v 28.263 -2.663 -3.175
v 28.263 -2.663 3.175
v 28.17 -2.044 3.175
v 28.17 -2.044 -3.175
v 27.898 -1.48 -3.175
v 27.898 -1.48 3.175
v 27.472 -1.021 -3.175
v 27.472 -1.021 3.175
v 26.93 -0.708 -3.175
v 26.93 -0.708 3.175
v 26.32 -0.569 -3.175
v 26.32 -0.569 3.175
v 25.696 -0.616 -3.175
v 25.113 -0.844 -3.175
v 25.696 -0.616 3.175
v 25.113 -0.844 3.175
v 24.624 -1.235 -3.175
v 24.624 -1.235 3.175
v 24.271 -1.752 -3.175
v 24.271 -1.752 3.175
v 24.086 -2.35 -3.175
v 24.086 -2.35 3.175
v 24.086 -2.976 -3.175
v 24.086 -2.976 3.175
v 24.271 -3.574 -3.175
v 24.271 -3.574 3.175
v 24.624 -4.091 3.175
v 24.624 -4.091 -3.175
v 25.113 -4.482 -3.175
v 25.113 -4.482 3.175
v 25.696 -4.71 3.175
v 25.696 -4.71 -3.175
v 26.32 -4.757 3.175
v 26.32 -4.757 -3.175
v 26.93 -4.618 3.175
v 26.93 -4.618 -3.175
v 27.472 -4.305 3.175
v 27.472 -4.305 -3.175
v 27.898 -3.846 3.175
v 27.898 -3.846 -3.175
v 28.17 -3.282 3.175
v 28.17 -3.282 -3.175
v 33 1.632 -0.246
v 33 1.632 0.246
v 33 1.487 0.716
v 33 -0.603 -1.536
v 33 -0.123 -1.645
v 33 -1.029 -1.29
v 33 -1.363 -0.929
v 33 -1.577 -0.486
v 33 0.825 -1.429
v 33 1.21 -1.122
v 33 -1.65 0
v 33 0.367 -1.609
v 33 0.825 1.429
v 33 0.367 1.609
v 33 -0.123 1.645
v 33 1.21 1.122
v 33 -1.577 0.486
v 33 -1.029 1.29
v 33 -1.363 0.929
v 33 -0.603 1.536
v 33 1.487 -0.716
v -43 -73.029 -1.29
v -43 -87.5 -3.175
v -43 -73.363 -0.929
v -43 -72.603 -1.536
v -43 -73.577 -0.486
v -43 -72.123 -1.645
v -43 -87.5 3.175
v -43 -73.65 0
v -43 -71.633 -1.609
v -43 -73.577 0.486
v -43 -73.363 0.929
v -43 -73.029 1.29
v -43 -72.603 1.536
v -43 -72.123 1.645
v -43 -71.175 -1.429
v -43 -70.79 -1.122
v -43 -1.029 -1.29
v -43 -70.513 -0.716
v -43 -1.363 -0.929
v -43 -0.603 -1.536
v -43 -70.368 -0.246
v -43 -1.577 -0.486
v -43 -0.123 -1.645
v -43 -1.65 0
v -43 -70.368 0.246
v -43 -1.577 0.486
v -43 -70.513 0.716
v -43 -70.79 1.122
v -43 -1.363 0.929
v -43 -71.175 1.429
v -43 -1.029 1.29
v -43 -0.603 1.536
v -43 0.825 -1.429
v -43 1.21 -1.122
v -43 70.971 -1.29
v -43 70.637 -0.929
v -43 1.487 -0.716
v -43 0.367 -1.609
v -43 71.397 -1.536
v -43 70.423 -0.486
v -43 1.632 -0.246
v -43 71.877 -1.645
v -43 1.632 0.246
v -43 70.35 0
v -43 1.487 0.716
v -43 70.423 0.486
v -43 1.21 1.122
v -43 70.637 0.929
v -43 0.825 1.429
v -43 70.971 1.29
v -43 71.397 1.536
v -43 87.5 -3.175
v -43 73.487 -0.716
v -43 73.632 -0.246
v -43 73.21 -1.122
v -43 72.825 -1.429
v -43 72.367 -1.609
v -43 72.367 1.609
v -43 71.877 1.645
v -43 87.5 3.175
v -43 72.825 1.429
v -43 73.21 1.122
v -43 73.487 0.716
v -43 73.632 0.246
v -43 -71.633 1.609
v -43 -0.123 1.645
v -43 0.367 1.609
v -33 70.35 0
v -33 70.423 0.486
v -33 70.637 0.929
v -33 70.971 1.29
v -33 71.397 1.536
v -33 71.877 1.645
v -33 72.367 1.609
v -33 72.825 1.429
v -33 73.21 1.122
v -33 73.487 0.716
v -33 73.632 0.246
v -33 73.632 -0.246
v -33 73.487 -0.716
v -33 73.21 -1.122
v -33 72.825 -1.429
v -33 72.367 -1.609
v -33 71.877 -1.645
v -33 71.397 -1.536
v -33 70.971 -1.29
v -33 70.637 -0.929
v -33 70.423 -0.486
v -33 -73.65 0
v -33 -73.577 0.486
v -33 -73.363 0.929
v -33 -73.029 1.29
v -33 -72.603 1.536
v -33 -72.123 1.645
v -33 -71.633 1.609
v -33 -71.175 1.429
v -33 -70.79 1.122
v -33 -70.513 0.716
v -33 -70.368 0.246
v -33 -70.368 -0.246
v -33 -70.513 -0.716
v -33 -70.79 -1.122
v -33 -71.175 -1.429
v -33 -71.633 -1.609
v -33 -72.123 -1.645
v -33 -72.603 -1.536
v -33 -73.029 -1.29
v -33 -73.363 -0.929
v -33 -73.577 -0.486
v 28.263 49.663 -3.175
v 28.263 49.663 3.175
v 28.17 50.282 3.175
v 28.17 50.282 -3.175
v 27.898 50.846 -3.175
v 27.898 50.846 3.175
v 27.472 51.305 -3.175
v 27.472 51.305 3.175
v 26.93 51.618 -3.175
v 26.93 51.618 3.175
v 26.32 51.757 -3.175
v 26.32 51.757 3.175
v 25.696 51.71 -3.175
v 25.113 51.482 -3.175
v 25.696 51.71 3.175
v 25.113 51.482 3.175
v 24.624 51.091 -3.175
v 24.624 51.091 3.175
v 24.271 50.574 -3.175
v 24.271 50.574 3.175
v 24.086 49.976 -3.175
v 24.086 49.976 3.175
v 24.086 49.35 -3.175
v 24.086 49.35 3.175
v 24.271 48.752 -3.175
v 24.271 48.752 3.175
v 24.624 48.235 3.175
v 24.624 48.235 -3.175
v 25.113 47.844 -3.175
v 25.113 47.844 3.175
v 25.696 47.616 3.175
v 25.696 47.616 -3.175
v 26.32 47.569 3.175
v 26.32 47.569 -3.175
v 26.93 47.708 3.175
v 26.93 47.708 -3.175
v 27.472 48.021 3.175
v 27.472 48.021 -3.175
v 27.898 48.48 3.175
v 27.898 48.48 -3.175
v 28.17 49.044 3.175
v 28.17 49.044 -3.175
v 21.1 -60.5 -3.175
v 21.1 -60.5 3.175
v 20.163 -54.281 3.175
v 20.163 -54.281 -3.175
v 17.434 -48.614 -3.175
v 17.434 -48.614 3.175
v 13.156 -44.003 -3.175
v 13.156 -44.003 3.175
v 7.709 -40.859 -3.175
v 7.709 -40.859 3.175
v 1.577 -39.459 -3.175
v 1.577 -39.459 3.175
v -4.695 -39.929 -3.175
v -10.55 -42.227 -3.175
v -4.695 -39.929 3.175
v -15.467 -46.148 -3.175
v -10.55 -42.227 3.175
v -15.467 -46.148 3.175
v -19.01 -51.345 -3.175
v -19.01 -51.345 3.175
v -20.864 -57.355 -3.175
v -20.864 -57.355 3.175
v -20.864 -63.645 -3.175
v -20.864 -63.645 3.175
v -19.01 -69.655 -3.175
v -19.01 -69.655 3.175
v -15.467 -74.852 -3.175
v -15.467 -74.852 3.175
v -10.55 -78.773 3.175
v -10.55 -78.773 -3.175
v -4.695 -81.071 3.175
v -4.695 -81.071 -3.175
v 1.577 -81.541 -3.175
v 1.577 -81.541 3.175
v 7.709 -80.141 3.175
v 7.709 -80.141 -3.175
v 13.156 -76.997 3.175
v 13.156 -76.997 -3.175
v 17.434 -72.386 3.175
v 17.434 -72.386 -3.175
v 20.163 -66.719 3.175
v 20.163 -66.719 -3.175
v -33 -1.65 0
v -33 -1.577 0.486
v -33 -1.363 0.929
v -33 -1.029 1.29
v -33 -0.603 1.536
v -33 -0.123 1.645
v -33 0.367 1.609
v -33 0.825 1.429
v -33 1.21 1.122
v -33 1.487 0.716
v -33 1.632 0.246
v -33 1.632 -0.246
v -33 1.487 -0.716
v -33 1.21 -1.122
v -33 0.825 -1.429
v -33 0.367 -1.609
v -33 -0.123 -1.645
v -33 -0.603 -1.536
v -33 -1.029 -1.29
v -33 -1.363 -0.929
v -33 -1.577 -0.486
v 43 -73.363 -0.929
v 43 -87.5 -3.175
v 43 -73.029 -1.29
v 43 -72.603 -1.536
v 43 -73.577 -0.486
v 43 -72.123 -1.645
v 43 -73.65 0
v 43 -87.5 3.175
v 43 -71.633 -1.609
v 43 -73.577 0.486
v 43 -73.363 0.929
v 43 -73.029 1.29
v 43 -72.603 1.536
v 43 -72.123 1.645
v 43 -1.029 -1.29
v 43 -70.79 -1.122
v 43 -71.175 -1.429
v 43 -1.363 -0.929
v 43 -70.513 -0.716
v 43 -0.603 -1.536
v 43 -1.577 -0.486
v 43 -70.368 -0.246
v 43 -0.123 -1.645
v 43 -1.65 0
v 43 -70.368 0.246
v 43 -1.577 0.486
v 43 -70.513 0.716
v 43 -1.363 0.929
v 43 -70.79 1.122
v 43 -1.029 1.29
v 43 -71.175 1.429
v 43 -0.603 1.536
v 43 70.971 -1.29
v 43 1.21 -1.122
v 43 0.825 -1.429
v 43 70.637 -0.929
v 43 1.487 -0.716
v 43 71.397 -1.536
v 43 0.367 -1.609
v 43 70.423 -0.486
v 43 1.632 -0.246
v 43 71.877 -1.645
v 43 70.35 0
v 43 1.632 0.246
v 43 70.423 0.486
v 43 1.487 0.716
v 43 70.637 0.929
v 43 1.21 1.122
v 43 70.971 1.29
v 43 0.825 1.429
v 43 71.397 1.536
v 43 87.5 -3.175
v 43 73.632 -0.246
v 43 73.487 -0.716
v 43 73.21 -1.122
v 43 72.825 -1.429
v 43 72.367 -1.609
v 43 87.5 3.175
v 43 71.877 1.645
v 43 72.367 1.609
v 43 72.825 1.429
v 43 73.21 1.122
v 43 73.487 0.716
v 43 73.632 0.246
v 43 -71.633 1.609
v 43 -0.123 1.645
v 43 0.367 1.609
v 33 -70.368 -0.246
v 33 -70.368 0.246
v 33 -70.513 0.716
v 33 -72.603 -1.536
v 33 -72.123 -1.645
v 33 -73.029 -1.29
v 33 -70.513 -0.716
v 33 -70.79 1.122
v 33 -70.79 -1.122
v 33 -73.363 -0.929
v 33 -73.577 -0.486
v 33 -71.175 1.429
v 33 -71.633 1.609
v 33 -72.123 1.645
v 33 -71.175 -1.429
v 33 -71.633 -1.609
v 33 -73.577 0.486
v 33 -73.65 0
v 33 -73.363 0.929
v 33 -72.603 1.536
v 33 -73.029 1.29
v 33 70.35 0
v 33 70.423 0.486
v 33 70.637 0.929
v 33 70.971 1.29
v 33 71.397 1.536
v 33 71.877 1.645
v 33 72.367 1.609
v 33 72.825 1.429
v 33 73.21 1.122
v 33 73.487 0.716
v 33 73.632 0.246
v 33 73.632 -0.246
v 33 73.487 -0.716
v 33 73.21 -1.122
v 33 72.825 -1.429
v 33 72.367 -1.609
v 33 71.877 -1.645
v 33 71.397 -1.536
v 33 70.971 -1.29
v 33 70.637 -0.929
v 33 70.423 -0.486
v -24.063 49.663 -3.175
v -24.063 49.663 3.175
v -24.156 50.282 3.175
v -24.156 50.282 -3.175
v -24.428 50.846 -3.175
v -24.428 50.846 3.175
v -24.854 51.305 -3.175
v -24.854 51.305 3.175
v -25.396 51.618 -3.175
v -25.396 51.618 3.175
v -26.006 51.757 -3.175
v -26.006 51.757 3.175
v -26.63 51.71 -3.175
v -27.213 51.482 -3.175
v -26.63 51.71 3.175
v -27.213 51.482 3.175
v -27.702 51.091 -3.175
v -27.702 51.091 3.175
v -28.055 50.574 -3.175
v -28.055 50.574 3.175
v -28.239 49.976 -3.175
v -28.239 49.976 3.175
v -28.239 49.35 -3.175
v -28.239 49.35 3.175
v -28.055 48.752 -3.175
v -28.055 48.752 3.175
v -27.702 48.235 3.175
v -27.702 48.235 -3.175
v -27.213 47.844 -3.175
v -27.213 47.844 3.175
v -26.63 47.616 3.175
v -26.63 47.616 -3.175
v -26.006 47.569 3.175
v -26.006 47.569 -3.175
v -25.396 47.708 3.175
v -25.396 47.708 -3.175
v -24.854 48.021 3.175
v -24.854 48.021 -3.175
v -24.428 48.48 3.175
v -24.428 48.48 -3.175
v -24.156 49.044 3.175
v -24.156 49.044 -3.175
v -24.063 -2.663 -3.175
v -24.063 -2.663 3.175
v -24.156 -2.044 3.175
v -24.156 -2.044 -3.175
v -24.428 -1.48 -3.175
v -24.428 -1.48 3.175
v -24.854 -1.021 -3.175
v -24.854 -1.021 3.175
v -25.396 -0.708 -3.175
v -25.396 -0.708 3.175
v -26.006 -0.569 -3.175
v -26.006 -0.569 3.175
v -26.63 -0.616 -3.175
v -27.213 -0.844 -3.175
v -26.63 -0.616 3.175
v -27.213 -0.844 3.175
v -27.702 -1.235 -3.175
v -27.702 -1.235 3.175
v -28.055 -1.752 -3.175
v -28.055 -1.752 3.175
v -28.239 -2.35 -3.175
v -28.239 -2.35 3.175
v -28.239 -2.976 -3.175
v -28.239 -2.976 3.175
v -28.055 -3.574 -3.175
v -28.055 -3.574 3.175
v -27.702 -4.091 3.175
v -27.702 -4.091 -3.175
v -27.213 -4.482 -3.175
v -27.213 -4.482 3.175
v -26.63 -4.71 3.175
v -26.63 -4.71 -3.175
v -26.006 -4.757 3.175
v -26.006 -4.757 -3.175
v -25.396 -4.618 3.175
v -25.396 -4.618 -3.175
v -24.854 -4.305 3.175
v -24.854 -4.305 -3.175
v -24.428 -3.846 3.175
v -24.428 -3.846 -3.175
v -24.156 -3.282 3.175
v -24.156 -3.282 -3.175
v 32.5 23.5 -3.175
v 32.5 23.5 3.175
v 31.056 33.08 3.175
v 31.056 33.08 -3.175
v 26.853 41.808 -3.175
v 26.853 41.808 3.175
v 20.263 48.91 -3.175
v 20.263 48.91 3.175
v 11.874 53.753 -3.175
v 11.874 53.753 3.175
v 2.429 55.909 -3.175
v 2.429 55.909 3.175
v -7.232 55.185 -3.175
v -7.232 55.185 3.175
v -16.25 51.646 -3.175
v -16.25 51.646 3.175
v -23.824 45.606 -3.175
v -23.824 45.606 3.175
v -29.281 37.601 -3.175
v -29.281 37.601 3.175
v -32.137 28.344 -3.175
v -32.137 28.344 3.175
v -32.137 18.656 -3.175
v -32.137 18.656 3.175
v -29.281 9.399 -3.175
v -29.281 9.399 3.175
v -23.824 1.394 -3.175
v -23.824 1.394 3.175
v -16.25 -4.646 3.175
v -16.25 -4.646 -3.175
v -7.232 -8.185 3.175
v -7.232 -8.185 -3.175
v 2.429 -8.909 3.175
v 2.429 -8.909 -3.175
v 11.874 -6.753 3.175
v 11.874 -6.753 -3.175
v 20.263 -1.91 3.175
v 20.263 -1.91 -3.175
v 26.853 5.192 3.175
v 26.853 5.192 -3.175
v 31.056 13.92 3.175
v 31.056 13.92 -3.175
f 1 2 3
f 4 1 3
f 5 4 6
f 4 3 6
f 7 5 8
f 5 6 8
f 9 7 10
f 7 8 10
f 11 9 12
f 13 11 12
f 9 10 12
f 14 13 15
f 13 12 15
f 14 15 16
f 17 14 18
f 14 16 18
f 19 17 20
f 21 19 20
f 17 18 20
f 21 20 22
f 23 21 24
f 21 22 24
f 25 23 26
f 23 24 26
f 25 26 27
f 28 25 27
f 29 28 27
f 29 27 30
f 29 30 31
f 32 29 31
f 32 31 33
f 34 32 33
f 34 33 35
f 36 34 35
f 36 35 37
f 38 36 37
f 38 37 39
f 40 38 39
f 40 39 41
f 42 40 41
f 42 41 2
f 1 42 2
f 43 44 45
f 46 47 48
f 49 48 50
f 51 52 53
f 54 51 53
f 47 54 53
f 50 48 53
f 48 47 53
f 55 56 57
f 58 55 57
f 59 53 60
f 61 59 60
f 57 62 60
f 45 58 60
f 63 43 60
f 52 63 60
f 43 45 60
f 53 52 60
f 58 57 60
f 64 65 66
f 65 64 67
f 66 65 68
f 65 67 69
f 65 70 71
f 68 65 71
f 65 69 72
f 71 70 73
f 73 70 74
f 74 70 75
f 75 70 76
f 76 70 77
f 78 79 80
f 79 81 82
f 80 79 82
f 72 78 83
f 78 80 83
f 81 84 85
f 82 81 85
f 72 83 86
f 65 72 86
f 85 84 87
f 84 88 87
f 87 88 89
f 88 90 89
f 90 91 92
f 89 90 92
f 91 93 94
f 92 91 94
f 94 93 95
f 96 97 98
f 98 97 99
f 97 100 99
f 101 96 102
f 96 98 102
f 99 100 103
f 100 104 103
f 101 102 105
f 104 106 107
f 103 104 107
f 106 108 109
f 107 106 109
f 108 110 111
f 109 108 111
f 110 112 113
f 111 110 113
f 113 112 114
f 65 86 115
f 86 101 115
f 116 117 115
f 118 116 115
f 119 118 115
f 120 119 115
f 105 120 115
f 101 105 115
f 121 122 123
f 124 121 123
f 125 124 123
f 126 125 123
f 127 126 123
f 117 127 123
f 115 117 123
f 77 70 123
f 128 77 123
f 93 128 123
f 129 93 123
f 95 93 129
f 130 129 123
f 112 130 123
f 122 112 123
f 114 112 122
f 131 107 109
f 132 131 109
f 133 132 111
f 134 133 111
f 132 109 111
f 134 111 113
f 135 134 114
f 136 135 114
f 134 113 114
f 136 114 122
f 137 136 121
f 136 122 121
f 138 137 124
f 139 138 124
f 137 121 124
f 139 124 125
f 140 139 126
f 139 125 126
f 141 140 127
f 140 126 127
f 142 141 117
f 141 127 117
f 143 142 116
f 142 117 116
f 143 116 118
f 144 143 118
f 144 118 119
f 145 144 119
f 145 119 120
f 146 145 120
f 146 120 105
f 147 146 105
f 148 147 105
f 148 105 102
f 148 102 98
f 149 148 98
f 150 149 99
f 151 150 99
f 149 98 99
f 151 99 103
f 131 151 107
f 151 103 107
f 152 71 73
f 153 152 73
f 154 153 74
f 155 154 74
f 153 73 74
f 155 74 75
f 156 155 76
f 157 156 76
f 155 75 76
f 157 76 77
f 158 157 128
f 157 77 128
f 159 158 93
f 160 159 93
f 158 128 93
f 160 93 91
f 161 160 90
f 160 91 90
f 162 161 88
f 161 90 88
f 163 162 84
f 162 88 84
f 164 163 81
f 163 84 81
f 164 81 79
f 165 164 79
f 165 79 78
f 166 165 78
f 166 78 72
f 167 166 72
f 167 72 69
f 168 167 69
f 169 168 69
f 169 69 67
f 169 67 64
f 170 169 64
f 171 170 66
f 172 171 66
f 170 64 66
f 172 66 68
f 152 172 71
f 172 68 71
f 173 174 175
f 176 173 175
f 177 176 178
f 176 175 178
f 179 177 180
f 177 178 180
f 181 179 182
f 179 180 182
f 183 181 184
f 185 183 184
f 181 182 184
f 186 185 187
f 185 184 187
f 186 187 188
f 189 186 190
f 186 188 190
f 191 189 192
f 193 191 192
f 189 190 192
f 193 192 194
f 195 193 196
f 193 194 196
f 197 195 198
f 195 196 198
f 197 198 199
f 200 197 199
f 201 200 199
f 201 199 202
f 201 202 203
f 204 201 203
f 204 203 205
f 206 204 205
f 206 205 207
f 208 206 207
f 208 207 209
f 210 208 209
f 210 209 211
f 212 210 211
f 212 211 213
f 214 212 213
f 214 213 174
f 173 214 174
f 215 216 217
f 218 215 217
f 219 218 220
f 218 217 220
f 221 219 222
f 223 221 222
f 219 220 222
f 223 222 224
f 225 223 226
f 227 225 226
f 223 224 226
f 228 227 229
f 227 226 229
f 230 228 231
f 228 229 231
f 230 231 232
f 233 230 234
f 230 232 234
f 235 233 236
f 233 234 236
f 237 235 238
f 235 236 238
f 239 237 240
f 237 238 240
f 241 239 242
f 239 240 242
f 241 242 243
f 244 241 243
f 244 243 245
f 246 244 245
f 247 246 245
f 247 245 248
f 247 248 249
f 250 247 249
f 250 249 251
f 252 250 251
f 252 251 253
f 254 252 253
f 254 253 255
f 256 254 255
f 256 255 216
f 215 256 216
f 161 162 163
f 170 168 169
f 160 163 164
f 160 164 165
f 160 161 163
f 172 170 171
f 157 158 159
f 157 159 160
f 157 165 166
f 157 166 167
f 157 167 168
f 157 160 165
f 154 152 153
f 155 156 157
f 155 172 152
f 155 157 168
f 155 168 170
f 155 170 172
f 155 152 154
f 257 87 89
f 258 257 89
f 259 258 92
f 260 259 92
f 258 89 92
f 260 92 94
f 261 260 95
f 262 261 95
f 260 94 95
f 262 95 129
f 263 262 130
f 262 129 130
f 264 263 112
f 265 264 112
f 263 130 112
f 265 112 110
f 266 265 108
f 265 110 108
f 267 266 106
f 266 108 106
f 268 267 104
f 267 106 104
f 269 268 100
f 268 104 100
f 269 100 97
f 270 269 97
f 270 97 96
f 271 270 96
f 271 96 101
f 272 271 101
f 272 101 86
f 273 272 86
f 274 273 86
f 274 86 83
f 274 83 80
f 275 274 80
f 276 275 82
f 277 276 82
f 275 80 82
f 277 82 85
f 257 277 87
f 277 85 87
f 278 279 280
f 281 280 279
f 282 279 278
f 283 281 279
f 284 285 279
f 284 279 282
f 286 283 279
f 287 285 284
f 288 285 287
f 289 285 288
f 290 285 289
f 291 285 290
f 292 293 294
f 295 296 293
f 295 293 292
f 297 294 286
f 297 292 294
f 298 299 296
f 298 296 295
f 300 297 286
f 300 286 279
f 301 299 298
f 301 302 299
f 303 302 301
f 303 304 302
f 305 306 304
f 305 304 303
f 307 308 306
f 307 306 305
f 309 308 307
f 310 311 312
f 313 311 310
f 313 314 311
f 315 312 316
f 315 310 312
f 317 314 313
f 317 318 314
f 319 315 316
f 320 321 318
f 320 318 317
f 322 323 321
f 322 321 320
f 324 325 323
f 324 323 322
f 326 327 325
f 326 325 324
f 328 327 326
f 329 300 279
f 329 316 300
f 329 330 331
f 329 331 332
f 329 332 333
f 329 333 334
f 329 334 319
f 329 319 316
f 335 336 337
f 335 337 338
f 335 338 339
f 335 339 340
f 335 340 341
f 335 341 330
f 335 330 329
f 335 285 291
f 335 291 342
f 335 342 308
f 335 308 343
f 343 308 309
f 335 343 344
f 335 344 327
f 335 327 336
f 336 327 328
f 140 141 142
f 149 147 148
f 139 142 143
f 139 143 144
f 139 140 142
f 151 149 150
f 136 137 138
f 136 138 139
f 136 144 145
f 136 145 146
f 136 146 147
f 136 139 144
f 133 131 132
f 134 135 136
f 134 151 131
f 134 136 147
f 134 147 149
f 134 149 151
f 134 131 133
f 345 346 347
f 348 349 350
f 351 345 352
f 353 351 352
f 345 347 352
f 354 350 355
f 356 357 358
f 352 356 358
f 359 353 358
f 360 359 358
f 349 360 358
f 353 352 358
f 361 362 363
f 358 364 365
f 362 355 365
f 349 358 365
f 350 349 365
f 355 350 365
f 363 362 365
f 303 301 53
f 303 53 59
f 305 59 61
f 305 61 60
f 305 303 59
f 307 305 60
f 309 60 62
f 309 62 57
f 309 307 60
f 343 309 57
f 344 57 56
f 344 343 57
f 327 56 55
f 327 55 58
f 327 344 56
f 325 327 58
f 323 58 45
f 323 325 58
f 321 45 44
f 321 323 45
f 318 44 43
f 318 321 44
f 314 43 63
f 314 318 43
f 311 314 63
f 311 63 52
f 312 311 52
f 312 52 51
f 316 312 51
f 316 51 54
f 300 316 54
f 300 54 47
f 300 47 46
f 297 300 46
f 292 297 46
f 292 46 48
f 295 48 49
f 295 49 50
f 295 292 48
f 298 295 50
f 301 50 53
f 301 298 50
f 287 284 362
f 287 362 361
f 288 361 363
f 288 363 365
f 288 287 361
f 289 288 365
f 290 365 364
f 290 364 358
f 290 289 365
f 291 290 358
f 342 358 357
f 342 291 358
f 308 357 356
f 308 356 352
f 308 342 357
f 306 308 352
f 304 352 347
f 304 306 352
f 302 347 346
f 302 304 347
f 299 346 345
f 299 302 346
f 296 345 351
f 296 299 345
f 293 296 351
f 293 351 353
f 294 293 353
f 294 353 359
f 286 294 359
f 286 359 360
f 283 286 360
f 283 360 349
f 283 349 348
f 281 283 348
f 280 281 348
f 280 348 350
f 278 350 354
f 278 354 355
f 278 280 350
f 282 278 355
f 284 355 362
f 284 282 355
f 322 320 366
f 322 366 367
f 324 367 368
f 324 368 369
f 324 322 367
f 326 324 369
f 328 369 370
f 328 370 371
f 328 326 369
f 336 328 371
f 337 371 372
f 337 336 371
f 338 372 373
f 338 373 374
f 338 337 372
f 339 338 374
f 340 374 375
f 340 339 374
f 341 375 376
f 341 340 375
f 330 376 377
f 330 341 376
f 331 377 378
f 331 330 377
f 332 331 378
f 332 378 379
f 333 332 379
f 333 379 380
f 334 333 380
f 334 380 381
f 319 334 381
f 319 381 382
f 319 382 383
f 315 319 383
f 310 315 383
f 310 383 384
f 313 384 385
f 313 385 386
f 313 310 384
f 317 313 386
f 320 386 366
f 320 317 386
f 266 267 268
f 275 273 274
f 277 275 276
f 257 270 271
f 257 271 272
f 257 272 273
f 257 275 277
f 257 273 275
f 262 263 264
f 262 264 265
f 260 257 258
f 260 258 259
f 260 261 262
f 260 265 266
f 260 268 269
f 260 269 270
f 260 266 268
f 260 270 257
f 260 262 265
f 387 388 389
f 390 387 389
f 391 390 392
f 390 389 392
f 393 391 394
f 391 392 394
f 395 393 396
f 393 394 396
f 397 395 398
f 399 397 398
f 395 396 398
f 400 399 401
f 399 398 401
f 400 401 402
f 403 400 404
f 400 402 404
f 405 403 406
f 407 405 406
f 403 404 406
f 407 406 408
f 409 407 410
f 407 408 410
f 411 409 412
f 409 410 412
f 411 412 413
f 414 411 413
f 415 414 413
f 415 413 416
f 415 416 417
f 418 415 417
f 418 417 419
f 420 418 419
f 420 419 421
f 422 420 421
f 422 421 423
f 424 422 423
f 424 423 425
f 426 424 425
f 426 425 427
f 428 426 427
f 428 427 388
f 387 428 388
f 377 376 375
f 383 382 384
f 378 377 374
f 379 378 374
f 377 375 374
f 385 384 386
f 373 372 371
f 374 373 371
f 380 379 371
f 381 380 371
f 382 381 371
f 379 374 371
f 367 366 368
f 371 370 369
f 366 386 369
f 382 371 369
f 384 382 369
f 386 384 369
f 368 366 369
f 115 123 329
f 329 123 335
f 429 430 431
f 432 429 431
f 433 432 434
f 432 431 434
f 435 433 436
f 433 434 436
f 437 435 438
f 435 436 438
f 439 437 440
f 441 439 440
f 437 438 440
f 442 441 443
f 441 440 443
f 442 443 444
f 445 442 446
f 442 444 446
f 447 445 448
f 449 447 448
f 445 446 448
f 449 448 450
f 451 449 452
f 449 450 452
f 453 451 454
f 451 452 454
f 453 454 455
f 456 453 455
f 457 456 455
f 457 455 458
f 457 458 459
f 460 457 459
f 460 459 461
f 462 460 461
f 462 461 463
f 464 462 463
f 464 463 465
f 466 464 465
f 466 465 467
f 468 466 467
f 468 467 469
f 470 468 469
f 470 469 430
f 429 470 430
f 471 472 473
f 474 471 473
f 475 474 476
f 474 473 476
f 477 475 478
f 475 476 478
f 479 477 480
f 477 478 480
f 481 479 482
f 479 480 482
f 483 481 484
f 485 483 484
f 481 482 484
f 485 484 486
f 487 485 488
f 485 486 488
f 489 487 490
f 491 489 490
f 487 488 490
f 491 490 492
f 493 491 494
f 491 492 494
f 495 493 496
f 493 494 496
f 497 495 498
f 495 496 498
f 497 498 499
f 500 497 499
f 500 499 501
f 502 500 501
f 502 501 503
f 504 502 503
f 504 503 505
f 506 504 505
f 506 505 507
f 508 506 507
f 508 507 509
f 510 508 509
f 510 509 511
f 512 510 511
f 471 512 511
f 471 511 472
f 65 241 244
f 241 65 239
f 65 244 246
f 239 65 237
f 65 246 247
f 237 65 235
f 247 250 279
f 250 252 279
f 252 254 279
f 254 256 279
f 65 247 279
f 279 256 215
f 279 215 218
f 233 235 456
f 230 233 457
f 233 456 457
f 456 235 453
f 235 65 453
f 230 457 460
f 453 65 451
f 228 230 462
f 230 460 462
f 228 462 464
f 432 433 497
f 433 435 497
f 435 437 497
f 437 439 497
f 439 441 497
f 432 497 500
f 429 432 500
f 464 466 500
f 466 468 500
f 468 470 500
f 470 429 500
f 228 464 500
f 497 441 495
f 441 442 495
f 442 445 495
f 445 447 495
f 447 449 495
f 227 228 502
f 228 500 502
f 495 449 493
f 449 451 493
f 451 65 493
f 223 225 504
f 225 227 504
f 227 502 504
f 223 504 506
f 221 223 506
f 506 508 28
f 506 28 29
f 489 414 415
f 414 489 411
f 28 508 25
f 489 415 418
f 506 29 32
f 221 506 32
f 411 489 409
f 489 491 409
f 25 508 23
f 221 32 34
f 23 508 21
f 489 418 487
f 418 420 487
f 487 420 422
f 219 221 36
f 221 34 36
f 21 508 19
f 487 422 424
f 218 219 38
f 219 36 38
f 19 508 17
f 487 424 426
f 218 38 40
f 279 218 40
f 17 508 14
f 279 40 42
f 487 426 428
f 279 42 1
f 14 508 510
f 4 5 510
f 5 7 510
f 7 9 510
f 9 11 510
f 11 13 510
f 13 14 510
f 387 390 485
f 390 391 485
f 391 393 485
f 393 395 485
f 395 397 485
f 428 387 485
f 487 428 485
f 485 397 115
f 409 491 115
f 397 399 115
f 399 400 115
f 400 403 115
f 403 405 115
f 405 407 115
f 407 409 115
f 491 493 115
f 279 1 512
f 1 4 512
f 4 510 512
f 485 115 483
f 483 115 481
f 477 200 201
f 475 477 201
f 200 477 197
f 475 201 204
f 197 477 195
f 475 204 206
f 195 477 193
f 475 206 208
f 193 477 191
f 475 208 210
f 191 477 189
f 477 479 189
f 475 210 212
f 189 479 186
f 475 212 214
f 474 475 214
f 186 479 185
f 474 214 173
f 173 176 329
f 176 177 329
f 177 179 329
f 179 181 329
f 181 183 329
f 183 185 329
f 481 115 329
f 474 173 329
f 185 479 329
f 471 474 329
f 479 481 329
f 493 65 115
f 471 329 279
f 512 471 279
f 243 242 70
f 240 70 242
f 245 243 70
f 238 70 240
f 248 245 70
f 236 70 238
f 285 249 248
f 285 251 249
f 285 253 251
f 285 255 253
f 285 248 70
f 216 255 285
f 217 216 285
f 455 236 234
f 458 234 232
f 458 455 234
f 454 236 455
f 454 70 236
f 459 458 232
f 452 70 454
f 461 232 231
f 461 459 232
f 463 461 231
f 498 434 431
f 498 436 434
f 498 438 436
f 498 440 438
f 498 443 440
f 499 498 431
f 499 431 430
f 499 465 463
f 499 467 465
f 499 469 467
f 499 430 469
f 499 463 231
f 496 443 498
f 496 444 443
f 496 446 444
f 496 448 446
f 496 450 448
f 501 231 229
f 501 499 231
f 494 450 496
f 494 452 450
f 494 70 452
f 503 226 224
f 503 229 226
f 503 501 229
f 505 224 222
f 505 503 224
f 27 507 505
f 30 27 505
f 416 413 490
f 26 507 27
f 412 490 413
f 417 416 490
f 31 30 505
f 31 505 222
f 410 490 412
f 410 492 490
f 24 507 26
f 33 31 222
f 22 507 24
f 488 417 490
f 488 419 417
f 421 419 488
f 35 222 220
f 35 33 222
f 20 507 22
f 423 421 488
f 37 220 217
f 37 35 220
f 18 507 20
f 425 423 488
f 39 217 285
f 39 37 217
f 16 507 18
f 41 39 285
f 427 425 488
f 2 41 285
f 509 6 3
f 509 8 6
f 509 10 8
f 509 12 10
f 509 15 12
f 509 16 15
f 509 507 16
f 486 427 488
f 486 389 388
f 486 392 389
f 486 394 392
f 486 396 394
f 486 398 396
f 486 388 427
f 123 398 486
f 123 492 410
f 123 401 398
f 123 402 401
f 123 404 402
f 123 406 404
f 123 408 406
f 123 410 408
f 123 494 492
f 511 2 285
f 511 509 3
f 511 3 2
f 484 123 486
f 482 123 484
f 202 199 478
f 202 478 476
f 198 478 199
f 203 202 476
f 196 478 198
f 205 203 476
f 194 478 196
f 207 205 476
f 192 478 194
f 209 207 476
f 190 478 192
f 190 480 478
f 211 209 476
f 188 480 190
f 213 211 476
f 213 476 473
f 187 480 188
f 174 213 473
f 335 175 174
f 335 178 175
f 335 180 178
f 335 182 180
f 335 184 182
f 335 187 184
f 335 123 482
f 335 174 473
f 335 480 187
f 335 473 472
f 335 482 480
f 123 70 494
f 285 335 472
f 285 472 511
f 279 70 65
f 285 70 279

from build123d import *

# Parameters (mm, degrees)
SKETCH1_W           = 86
SKETCH1_H           = 175
BOSS_EXTRUDE1_DEPTH = 3.175
SKETCH3_R           = 1.65
CUT_EXTRUDE1_DEPTH  = 10
SKETCH4_R           = 32.5
CUT_EXTRUDE2_DEPTH  = 98.701445742
SKETCH4_3_R         = 2.1
CUT_EXTRUDE3_DEPTH  = 98.701445742
SKETCH7_R           = 21.1
CUT_EXTRUDE4_DEPTH  = 98.701445742


with BuildPart() as part:
    # Sketch1 → Boss-Extrude1 (new, symmetric)
    with BuildSketch(Plane.XY):
        Rectangle(SKETCH1_W, SKETCH1_H)
    extrude(amount=BOSS_EXTRUDE1_DEPTH, both=True)

    # Sketch3 → Cut-Extrude1 (cut)
    with BuildSketch(Plane.ZY.offset(43)):
        with Locations((0, 72)):
            Circle(SKETCH3_R)
        Circle(SKETCH3_R)
        with Locations((0, -72)):
            Circle(SKETCH3_R)
    cut_extrude1 = extrude(amount=-CUT_EXTRUDE1_DEPTH, mode=Mode.SUBTRACT)

    # Mirror1: Cut-Extrude1 across plane
    add(cut_extrude1.mirror(Plane(origin=(0, 0, 0), x_dir=(0, 0, 1), z_dir=(1, 0, 0))), mode=Mode.SUBTRACT)

    # Sketch4 → Cut-Extrude2 (cut, through all)
    with BuildSketch(Plane.XY.offset(3.175)):
        with Locations((0, 23.5)):
            Circle(SKETCH4_R)
    extrude(amount=-CUT_EXTRUDE2_DEPTH, mode=Mode.SUBTRACT)

    # Sketch4<3> → Cut-Extrude3 (cut, through all)
    with BuildSketch(Plane.XY.offset(3.175)):
        with Locations((-26.162950904, 49.662950904)):
            Circle(SKETCH4_3_R)
        with Locations((26.162950904, 49.662950904)):
            Circle(SKETCH4_3_R)
        with Locations((26.162950904, -2.662950904)):
            Circle(SKETCH4_3_R)
        with Locations((-26.162950904, -2.662950904)):
            Circle(SKETCH4_3_R)
    extrude(amount=-CUT_EXTRUDE3_DEPTH, mode=Mode.SUBTRACT)

    # Sketch7 → Cut-Extrude4 (cut, through all)
    with BuildSketch(Plane.XY.offset(3.175)):
        with Locations((0, -60.5)):
            Circle(SKETCH7_R)
    extrude(amount=-CUT_EXTRUDE4_DEPTH, mode=Mode.SUBTRACT)


solid = part.part
